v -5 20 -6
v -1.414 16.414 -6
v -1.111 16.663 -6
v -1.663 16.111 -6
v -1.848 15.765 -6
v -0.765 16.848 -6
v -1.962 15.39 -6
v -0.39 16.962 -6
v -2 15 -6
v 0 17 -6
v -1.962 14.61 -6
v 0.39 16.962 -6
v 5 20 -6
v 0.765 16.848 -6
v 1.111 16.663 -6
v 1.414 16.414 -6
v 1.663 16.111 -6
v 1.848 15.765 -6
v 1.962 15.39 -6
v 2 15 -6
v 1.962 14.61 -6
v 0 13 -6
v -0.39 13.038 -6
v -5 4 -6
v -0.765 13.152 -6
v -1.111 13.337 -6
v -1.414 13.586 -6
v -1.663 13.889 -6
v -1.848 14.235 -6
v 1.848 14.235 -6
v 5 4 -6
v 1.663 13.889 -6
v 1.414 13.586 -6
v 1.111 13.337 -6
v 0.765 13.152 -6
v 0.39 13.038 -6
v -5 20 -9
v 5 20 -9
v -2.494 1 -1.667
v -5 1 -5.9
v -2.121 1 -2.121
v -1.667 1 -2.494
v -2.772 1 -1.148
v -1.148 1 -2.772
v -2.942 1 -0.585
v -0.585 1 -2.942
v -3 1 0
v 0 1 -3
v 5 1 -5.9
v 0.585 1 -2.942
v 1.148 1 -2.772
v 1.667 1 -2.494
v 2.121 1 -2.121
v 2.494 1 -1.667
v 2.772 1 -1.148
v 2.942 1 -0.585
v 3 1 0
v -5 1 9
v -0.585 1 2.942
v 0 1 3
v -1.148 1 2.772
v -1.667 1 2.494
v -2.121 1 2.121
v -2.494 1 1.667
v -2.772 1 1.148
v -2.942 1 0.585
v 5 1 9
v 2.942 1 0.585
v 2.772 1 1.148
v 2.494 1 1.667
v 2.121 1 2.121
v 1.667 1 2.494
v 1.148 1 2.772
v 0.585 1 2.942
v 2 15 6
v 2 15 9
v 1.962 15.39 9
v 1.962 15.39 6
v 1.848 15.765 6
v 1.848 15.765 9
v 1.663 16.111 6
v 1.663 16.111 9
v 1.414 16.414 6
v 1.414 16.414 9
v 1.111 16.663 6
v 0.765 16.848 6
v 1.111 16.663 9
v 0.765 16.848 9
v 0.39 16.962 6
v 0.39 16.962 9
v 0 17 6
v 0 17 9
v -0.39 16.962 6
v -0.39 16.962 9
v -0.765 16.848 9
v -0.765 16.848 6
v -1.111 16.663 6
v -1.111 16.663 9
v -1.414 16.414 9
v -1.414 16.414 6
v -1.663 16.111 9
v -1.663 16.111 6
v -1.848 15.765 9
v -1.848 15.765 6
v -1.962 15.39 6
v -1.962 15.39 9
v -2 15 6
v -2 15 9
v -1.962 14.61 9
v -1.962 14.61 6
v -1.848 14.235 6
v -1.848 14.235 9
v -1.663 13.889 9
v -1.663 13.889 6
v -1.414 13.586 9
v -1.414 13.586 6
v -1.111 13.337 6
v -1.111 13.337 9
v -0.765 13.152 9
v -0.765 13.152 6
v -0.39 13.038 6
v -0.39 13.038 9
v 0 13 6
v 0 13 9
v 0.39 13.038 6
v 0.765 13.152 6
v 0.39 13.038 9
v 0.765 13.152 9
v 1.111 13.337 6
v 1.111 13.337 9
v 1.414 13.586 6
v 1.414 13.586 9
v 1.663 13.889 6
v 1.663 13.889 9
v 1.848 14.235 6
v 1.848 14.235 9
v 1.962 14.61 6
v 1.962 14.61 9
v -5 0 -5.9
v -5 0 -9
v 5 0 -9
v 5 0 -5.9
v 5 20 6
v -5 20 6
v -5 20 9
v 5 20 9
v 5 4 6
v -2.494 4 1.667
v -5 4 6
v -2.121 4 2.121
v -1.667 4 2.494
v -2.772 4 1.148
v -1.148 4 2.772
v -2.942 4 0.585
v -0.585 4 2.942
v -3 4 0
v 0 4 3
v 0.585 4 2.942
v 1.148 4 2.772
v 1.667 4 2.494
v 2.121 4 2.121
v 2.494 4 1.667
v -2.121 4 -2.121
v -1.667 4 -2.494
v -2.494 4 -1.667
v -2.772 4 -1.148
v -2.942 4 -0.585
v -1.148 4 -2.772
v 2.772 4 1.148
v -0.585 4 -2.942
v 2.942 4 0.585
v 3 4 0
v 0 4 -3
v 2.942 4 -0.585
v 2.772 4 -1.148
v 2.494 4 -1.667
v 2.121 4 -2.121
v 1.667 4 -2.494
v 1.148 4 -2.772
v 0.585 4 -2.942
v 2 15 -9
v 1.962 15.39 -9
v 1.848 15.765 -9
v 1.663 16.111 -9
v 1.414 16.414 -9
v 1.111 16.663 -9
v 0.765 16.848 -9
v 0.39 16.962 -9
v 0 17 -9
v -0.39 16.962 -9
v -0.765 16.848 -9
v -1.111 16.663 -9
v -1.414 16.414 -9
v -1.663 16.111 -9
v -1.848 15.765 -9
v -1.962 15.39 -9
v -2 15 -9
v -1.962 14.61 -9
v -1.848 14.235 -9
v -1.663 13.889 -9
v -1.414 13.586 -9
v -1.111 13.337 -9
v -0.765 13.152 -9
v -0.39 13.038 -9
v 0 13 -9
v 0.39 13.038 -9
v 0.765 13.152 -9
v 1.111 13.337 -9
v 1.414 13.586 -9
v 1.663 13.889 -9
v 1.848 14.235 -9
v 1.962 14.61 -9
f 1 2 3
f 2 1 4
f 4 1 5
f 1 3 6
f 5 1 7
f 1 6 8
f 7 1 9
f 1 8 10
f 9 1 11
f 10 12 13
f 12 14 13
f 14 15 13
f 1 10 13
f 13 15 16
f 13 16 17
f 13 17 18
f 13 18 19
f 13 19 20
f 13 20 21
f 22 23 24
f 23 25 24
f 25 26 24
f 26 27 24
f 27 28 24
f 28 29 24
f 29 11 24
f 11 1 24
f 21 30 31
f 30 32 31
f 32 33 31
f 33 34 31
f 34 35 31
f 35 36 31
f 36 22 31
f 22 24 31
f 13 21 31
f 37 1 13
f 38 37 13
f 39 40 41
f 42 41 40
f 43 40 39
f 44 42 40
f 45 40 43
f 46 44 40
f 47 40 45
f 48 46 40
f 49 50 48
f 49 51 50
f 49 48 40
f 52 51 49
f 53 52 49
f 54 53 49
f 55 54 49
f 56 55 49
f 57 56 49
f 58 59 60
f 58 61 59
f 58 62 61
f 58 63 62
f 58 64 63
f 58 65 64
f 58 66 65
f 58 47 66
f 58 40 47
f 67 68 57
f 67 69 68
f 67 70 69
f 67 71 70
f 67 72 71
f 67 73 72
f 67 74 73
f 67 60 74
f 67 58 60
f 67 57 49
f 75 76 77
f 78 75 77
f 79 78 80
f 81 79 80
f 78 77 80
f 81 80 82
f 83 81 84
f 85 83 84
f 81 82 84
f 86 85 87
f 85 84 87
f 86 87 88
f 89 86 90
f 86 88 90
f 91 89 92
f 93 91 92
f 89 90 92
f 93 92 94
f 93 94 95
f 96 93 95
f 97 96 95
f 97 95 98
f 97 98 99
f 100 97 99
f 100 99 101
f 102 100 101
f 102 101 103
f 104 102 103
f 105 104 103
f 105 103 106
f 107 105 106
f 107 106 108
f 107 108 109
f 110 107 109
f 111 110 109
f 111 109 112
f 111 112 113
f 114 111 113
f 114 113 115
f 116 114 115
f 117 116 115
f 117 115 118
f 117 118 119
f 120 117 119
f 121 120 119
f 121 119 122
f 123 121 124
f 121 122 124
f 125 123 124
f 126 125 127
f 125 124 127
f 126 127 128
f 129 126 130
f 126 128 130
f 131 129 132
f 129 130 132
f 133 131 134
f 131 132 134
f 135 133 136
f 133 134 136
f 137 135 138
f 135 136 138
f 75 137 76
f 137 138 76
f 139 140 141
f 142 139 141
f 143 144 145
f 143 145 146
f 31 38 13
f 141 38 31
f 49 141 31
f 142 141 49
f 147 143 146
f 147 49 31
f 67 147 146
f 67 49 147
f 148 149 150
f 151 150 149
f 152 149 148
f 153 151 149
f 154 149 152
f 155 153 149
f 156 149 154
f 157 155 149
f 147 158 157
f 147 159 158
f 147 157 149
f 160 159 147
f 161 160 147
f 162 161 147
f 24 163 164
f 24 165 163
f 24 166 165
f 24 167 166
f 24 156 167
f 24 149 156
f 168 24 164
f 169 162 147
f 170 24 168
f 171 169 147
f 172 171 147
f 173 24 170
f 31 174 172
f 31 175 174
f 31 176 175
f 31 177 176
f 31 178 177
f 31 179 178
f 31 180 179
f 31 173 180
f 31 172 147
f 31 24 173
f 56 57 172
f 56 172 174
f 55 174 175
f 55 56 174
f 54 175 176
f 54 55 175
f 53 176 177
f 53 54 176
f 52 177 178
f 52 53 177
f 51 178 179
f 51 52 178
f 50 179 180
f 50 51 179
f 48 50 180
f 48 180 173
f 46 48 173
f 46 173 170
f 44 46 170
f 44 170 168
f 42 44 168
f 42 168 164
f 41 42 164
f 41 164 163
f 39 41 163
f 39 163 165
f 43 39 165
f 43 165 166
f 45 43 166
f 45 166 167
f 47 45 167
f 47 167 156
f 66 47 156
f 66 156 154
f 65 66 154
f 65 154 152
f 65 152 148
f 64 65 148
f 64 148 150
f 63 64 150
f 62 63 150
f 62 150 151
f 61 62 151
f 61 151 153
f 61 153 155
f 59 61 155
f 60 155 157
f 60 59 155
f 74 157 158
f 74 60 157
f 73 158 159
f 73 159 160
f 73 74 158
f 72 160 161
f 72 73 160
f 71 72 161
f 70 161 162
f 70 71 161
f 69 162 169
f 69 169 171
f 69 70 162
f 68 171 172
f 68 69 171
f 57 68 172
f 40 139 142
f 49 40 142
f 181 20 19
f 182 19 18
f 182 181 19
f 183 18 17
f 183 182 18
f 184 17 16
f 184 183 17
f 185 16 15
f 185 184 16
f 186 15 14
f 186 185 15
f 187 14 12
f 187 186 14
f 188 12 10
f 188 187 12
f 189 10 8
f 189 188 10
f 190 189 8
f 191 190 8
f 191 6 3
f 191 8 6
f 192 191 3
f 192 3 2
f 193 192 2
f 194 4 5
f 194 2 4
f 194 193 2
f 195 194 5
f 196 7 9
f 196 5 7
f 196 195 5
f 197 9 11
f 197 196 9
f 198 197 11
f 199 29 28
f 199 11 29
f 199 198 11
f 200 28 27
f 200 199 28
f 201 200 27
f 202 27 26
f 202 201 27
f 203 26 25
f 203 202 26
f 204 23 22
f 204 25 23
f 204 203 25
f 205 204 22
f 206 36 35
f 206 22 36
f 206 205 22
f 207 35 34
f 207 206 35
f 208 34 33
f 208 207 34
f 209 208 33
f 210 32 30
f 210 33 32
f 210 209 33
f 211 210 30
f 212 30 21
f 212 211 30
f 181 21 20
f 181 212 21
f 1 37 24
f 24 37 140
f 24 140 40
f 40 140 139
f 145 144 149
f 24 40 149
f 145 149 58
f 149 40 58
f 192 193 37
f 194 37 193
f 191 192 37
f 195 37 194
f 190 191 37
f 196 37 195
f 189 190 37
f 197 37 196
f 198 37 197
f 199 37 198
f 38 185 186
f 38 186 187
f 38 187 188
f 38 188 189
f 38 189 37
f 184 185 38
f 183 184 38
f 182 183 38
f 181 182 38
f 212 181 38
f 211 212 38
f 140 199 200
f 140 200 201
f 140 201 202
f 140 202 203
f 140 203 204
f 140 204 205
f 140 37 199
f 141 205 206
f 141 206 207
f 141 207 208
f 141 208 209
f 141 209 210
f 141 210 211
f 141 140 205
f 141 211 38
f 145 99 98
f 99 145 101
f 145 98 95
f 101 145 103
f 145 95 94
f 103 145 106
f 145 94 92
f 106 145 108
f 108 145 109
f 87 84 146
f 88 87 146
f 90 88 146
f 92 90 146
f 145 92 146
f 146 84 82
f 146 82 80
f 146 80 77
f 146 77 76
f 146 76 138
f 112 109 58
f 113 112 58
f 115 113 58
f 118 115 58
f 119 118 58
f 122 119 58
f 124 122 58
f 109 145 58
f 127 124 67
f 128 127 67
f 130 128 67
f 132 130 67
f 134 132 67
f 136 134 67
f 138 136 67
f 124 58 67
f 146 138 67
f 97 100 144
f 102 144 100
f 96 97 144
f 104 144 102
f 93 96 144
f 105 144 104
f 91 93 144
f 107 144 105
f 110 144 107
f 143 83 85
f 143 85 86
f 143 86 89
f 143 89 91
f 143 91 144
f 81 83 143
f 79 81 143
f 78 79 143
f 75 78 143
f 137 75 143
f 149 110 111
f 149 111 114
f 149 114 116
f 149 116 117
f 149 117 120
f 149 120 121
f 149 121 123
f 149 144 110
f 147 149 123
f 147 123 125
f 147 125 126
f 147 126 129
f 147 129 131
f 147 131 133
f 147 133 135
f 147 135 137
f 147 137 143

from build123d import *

# Parameters (mm, degrees)
SKETCH_1_W          = 10
SKETCH_1_H          = 18
SKETCH_1_R          = 3
EXTRUDE_2_DEPTH     = 4
SKETCH_3_W          = 10
SKETCH_3_H          = 3
EXTRUDE_3_DEPTH     = 16
SKETCH_4_R          = 2
CUT_EXTRUDE_1_DEPTH = 19
SKETCH_6_W          = 10
SKETCH_6_H          = 14.9
CUT_EXTRUDE_2_DEPTH = 1


with BuildPart() as part:
    # 草图1 → 凸台-拉伸2 (new body)
    with BuildSketch(Plane(origin=(0, 0, 0), x_dir=(1, 0, 0), z_dir=(0, 1, 0))):
        Rectangle(SKETCH_1_W, SKETCH_1_H)
        Circle(SKETCH_1_R, mode=Mode.SUBTRACT)
    extrude(amount=EXTRUDE_2_DEPTH)

    # 草图3 → 凸台-拉伸3 (add)
    with BuildSketch(Plane(origin=(0, 4, 0), x_dir=(1, 0, 0), z_dir=(0, 1, 0))):
        with Locations((0, -7.5)):
            Rectangle(SKETCH_3_W, SKETCH_3_H)
    extrude_3 = extrude(amount=EXTRUDE_3_DEPTH)

    # 草图4 → 切除-拉伸1 (cut, through all)
    with BuildSketch(Plane.XY.offset(9)):
        with Locations((0, 15)):
            Circle(SKETCH_4_R)
    cut_extrude_1 = extrude(amount=-CUT_EXTRUDE_1_DEPTH, mode=Mode.SUBTRACT)

    # 镜向1: 凸台-拉伸3, 切除-拉伸1 across plane
    add(extrude_3.mirror(Plane.XY))
    add(cut_extrude_1.mirror(Plane.XY), mode=Mode.SUBTRACT)

    # 草图6 → 切除-拉伸2 (cut)
    with BuildSketch(Plane.XZ):
        with Locations((0, 1.55)):
            Rectangle(SKETCH_6_W, SKETCH_6_H)
    extrude(amount=-CUT_EXTRUDE_2_DEPTH, mode=Mode.SUBTRACT)


solid = part.part
